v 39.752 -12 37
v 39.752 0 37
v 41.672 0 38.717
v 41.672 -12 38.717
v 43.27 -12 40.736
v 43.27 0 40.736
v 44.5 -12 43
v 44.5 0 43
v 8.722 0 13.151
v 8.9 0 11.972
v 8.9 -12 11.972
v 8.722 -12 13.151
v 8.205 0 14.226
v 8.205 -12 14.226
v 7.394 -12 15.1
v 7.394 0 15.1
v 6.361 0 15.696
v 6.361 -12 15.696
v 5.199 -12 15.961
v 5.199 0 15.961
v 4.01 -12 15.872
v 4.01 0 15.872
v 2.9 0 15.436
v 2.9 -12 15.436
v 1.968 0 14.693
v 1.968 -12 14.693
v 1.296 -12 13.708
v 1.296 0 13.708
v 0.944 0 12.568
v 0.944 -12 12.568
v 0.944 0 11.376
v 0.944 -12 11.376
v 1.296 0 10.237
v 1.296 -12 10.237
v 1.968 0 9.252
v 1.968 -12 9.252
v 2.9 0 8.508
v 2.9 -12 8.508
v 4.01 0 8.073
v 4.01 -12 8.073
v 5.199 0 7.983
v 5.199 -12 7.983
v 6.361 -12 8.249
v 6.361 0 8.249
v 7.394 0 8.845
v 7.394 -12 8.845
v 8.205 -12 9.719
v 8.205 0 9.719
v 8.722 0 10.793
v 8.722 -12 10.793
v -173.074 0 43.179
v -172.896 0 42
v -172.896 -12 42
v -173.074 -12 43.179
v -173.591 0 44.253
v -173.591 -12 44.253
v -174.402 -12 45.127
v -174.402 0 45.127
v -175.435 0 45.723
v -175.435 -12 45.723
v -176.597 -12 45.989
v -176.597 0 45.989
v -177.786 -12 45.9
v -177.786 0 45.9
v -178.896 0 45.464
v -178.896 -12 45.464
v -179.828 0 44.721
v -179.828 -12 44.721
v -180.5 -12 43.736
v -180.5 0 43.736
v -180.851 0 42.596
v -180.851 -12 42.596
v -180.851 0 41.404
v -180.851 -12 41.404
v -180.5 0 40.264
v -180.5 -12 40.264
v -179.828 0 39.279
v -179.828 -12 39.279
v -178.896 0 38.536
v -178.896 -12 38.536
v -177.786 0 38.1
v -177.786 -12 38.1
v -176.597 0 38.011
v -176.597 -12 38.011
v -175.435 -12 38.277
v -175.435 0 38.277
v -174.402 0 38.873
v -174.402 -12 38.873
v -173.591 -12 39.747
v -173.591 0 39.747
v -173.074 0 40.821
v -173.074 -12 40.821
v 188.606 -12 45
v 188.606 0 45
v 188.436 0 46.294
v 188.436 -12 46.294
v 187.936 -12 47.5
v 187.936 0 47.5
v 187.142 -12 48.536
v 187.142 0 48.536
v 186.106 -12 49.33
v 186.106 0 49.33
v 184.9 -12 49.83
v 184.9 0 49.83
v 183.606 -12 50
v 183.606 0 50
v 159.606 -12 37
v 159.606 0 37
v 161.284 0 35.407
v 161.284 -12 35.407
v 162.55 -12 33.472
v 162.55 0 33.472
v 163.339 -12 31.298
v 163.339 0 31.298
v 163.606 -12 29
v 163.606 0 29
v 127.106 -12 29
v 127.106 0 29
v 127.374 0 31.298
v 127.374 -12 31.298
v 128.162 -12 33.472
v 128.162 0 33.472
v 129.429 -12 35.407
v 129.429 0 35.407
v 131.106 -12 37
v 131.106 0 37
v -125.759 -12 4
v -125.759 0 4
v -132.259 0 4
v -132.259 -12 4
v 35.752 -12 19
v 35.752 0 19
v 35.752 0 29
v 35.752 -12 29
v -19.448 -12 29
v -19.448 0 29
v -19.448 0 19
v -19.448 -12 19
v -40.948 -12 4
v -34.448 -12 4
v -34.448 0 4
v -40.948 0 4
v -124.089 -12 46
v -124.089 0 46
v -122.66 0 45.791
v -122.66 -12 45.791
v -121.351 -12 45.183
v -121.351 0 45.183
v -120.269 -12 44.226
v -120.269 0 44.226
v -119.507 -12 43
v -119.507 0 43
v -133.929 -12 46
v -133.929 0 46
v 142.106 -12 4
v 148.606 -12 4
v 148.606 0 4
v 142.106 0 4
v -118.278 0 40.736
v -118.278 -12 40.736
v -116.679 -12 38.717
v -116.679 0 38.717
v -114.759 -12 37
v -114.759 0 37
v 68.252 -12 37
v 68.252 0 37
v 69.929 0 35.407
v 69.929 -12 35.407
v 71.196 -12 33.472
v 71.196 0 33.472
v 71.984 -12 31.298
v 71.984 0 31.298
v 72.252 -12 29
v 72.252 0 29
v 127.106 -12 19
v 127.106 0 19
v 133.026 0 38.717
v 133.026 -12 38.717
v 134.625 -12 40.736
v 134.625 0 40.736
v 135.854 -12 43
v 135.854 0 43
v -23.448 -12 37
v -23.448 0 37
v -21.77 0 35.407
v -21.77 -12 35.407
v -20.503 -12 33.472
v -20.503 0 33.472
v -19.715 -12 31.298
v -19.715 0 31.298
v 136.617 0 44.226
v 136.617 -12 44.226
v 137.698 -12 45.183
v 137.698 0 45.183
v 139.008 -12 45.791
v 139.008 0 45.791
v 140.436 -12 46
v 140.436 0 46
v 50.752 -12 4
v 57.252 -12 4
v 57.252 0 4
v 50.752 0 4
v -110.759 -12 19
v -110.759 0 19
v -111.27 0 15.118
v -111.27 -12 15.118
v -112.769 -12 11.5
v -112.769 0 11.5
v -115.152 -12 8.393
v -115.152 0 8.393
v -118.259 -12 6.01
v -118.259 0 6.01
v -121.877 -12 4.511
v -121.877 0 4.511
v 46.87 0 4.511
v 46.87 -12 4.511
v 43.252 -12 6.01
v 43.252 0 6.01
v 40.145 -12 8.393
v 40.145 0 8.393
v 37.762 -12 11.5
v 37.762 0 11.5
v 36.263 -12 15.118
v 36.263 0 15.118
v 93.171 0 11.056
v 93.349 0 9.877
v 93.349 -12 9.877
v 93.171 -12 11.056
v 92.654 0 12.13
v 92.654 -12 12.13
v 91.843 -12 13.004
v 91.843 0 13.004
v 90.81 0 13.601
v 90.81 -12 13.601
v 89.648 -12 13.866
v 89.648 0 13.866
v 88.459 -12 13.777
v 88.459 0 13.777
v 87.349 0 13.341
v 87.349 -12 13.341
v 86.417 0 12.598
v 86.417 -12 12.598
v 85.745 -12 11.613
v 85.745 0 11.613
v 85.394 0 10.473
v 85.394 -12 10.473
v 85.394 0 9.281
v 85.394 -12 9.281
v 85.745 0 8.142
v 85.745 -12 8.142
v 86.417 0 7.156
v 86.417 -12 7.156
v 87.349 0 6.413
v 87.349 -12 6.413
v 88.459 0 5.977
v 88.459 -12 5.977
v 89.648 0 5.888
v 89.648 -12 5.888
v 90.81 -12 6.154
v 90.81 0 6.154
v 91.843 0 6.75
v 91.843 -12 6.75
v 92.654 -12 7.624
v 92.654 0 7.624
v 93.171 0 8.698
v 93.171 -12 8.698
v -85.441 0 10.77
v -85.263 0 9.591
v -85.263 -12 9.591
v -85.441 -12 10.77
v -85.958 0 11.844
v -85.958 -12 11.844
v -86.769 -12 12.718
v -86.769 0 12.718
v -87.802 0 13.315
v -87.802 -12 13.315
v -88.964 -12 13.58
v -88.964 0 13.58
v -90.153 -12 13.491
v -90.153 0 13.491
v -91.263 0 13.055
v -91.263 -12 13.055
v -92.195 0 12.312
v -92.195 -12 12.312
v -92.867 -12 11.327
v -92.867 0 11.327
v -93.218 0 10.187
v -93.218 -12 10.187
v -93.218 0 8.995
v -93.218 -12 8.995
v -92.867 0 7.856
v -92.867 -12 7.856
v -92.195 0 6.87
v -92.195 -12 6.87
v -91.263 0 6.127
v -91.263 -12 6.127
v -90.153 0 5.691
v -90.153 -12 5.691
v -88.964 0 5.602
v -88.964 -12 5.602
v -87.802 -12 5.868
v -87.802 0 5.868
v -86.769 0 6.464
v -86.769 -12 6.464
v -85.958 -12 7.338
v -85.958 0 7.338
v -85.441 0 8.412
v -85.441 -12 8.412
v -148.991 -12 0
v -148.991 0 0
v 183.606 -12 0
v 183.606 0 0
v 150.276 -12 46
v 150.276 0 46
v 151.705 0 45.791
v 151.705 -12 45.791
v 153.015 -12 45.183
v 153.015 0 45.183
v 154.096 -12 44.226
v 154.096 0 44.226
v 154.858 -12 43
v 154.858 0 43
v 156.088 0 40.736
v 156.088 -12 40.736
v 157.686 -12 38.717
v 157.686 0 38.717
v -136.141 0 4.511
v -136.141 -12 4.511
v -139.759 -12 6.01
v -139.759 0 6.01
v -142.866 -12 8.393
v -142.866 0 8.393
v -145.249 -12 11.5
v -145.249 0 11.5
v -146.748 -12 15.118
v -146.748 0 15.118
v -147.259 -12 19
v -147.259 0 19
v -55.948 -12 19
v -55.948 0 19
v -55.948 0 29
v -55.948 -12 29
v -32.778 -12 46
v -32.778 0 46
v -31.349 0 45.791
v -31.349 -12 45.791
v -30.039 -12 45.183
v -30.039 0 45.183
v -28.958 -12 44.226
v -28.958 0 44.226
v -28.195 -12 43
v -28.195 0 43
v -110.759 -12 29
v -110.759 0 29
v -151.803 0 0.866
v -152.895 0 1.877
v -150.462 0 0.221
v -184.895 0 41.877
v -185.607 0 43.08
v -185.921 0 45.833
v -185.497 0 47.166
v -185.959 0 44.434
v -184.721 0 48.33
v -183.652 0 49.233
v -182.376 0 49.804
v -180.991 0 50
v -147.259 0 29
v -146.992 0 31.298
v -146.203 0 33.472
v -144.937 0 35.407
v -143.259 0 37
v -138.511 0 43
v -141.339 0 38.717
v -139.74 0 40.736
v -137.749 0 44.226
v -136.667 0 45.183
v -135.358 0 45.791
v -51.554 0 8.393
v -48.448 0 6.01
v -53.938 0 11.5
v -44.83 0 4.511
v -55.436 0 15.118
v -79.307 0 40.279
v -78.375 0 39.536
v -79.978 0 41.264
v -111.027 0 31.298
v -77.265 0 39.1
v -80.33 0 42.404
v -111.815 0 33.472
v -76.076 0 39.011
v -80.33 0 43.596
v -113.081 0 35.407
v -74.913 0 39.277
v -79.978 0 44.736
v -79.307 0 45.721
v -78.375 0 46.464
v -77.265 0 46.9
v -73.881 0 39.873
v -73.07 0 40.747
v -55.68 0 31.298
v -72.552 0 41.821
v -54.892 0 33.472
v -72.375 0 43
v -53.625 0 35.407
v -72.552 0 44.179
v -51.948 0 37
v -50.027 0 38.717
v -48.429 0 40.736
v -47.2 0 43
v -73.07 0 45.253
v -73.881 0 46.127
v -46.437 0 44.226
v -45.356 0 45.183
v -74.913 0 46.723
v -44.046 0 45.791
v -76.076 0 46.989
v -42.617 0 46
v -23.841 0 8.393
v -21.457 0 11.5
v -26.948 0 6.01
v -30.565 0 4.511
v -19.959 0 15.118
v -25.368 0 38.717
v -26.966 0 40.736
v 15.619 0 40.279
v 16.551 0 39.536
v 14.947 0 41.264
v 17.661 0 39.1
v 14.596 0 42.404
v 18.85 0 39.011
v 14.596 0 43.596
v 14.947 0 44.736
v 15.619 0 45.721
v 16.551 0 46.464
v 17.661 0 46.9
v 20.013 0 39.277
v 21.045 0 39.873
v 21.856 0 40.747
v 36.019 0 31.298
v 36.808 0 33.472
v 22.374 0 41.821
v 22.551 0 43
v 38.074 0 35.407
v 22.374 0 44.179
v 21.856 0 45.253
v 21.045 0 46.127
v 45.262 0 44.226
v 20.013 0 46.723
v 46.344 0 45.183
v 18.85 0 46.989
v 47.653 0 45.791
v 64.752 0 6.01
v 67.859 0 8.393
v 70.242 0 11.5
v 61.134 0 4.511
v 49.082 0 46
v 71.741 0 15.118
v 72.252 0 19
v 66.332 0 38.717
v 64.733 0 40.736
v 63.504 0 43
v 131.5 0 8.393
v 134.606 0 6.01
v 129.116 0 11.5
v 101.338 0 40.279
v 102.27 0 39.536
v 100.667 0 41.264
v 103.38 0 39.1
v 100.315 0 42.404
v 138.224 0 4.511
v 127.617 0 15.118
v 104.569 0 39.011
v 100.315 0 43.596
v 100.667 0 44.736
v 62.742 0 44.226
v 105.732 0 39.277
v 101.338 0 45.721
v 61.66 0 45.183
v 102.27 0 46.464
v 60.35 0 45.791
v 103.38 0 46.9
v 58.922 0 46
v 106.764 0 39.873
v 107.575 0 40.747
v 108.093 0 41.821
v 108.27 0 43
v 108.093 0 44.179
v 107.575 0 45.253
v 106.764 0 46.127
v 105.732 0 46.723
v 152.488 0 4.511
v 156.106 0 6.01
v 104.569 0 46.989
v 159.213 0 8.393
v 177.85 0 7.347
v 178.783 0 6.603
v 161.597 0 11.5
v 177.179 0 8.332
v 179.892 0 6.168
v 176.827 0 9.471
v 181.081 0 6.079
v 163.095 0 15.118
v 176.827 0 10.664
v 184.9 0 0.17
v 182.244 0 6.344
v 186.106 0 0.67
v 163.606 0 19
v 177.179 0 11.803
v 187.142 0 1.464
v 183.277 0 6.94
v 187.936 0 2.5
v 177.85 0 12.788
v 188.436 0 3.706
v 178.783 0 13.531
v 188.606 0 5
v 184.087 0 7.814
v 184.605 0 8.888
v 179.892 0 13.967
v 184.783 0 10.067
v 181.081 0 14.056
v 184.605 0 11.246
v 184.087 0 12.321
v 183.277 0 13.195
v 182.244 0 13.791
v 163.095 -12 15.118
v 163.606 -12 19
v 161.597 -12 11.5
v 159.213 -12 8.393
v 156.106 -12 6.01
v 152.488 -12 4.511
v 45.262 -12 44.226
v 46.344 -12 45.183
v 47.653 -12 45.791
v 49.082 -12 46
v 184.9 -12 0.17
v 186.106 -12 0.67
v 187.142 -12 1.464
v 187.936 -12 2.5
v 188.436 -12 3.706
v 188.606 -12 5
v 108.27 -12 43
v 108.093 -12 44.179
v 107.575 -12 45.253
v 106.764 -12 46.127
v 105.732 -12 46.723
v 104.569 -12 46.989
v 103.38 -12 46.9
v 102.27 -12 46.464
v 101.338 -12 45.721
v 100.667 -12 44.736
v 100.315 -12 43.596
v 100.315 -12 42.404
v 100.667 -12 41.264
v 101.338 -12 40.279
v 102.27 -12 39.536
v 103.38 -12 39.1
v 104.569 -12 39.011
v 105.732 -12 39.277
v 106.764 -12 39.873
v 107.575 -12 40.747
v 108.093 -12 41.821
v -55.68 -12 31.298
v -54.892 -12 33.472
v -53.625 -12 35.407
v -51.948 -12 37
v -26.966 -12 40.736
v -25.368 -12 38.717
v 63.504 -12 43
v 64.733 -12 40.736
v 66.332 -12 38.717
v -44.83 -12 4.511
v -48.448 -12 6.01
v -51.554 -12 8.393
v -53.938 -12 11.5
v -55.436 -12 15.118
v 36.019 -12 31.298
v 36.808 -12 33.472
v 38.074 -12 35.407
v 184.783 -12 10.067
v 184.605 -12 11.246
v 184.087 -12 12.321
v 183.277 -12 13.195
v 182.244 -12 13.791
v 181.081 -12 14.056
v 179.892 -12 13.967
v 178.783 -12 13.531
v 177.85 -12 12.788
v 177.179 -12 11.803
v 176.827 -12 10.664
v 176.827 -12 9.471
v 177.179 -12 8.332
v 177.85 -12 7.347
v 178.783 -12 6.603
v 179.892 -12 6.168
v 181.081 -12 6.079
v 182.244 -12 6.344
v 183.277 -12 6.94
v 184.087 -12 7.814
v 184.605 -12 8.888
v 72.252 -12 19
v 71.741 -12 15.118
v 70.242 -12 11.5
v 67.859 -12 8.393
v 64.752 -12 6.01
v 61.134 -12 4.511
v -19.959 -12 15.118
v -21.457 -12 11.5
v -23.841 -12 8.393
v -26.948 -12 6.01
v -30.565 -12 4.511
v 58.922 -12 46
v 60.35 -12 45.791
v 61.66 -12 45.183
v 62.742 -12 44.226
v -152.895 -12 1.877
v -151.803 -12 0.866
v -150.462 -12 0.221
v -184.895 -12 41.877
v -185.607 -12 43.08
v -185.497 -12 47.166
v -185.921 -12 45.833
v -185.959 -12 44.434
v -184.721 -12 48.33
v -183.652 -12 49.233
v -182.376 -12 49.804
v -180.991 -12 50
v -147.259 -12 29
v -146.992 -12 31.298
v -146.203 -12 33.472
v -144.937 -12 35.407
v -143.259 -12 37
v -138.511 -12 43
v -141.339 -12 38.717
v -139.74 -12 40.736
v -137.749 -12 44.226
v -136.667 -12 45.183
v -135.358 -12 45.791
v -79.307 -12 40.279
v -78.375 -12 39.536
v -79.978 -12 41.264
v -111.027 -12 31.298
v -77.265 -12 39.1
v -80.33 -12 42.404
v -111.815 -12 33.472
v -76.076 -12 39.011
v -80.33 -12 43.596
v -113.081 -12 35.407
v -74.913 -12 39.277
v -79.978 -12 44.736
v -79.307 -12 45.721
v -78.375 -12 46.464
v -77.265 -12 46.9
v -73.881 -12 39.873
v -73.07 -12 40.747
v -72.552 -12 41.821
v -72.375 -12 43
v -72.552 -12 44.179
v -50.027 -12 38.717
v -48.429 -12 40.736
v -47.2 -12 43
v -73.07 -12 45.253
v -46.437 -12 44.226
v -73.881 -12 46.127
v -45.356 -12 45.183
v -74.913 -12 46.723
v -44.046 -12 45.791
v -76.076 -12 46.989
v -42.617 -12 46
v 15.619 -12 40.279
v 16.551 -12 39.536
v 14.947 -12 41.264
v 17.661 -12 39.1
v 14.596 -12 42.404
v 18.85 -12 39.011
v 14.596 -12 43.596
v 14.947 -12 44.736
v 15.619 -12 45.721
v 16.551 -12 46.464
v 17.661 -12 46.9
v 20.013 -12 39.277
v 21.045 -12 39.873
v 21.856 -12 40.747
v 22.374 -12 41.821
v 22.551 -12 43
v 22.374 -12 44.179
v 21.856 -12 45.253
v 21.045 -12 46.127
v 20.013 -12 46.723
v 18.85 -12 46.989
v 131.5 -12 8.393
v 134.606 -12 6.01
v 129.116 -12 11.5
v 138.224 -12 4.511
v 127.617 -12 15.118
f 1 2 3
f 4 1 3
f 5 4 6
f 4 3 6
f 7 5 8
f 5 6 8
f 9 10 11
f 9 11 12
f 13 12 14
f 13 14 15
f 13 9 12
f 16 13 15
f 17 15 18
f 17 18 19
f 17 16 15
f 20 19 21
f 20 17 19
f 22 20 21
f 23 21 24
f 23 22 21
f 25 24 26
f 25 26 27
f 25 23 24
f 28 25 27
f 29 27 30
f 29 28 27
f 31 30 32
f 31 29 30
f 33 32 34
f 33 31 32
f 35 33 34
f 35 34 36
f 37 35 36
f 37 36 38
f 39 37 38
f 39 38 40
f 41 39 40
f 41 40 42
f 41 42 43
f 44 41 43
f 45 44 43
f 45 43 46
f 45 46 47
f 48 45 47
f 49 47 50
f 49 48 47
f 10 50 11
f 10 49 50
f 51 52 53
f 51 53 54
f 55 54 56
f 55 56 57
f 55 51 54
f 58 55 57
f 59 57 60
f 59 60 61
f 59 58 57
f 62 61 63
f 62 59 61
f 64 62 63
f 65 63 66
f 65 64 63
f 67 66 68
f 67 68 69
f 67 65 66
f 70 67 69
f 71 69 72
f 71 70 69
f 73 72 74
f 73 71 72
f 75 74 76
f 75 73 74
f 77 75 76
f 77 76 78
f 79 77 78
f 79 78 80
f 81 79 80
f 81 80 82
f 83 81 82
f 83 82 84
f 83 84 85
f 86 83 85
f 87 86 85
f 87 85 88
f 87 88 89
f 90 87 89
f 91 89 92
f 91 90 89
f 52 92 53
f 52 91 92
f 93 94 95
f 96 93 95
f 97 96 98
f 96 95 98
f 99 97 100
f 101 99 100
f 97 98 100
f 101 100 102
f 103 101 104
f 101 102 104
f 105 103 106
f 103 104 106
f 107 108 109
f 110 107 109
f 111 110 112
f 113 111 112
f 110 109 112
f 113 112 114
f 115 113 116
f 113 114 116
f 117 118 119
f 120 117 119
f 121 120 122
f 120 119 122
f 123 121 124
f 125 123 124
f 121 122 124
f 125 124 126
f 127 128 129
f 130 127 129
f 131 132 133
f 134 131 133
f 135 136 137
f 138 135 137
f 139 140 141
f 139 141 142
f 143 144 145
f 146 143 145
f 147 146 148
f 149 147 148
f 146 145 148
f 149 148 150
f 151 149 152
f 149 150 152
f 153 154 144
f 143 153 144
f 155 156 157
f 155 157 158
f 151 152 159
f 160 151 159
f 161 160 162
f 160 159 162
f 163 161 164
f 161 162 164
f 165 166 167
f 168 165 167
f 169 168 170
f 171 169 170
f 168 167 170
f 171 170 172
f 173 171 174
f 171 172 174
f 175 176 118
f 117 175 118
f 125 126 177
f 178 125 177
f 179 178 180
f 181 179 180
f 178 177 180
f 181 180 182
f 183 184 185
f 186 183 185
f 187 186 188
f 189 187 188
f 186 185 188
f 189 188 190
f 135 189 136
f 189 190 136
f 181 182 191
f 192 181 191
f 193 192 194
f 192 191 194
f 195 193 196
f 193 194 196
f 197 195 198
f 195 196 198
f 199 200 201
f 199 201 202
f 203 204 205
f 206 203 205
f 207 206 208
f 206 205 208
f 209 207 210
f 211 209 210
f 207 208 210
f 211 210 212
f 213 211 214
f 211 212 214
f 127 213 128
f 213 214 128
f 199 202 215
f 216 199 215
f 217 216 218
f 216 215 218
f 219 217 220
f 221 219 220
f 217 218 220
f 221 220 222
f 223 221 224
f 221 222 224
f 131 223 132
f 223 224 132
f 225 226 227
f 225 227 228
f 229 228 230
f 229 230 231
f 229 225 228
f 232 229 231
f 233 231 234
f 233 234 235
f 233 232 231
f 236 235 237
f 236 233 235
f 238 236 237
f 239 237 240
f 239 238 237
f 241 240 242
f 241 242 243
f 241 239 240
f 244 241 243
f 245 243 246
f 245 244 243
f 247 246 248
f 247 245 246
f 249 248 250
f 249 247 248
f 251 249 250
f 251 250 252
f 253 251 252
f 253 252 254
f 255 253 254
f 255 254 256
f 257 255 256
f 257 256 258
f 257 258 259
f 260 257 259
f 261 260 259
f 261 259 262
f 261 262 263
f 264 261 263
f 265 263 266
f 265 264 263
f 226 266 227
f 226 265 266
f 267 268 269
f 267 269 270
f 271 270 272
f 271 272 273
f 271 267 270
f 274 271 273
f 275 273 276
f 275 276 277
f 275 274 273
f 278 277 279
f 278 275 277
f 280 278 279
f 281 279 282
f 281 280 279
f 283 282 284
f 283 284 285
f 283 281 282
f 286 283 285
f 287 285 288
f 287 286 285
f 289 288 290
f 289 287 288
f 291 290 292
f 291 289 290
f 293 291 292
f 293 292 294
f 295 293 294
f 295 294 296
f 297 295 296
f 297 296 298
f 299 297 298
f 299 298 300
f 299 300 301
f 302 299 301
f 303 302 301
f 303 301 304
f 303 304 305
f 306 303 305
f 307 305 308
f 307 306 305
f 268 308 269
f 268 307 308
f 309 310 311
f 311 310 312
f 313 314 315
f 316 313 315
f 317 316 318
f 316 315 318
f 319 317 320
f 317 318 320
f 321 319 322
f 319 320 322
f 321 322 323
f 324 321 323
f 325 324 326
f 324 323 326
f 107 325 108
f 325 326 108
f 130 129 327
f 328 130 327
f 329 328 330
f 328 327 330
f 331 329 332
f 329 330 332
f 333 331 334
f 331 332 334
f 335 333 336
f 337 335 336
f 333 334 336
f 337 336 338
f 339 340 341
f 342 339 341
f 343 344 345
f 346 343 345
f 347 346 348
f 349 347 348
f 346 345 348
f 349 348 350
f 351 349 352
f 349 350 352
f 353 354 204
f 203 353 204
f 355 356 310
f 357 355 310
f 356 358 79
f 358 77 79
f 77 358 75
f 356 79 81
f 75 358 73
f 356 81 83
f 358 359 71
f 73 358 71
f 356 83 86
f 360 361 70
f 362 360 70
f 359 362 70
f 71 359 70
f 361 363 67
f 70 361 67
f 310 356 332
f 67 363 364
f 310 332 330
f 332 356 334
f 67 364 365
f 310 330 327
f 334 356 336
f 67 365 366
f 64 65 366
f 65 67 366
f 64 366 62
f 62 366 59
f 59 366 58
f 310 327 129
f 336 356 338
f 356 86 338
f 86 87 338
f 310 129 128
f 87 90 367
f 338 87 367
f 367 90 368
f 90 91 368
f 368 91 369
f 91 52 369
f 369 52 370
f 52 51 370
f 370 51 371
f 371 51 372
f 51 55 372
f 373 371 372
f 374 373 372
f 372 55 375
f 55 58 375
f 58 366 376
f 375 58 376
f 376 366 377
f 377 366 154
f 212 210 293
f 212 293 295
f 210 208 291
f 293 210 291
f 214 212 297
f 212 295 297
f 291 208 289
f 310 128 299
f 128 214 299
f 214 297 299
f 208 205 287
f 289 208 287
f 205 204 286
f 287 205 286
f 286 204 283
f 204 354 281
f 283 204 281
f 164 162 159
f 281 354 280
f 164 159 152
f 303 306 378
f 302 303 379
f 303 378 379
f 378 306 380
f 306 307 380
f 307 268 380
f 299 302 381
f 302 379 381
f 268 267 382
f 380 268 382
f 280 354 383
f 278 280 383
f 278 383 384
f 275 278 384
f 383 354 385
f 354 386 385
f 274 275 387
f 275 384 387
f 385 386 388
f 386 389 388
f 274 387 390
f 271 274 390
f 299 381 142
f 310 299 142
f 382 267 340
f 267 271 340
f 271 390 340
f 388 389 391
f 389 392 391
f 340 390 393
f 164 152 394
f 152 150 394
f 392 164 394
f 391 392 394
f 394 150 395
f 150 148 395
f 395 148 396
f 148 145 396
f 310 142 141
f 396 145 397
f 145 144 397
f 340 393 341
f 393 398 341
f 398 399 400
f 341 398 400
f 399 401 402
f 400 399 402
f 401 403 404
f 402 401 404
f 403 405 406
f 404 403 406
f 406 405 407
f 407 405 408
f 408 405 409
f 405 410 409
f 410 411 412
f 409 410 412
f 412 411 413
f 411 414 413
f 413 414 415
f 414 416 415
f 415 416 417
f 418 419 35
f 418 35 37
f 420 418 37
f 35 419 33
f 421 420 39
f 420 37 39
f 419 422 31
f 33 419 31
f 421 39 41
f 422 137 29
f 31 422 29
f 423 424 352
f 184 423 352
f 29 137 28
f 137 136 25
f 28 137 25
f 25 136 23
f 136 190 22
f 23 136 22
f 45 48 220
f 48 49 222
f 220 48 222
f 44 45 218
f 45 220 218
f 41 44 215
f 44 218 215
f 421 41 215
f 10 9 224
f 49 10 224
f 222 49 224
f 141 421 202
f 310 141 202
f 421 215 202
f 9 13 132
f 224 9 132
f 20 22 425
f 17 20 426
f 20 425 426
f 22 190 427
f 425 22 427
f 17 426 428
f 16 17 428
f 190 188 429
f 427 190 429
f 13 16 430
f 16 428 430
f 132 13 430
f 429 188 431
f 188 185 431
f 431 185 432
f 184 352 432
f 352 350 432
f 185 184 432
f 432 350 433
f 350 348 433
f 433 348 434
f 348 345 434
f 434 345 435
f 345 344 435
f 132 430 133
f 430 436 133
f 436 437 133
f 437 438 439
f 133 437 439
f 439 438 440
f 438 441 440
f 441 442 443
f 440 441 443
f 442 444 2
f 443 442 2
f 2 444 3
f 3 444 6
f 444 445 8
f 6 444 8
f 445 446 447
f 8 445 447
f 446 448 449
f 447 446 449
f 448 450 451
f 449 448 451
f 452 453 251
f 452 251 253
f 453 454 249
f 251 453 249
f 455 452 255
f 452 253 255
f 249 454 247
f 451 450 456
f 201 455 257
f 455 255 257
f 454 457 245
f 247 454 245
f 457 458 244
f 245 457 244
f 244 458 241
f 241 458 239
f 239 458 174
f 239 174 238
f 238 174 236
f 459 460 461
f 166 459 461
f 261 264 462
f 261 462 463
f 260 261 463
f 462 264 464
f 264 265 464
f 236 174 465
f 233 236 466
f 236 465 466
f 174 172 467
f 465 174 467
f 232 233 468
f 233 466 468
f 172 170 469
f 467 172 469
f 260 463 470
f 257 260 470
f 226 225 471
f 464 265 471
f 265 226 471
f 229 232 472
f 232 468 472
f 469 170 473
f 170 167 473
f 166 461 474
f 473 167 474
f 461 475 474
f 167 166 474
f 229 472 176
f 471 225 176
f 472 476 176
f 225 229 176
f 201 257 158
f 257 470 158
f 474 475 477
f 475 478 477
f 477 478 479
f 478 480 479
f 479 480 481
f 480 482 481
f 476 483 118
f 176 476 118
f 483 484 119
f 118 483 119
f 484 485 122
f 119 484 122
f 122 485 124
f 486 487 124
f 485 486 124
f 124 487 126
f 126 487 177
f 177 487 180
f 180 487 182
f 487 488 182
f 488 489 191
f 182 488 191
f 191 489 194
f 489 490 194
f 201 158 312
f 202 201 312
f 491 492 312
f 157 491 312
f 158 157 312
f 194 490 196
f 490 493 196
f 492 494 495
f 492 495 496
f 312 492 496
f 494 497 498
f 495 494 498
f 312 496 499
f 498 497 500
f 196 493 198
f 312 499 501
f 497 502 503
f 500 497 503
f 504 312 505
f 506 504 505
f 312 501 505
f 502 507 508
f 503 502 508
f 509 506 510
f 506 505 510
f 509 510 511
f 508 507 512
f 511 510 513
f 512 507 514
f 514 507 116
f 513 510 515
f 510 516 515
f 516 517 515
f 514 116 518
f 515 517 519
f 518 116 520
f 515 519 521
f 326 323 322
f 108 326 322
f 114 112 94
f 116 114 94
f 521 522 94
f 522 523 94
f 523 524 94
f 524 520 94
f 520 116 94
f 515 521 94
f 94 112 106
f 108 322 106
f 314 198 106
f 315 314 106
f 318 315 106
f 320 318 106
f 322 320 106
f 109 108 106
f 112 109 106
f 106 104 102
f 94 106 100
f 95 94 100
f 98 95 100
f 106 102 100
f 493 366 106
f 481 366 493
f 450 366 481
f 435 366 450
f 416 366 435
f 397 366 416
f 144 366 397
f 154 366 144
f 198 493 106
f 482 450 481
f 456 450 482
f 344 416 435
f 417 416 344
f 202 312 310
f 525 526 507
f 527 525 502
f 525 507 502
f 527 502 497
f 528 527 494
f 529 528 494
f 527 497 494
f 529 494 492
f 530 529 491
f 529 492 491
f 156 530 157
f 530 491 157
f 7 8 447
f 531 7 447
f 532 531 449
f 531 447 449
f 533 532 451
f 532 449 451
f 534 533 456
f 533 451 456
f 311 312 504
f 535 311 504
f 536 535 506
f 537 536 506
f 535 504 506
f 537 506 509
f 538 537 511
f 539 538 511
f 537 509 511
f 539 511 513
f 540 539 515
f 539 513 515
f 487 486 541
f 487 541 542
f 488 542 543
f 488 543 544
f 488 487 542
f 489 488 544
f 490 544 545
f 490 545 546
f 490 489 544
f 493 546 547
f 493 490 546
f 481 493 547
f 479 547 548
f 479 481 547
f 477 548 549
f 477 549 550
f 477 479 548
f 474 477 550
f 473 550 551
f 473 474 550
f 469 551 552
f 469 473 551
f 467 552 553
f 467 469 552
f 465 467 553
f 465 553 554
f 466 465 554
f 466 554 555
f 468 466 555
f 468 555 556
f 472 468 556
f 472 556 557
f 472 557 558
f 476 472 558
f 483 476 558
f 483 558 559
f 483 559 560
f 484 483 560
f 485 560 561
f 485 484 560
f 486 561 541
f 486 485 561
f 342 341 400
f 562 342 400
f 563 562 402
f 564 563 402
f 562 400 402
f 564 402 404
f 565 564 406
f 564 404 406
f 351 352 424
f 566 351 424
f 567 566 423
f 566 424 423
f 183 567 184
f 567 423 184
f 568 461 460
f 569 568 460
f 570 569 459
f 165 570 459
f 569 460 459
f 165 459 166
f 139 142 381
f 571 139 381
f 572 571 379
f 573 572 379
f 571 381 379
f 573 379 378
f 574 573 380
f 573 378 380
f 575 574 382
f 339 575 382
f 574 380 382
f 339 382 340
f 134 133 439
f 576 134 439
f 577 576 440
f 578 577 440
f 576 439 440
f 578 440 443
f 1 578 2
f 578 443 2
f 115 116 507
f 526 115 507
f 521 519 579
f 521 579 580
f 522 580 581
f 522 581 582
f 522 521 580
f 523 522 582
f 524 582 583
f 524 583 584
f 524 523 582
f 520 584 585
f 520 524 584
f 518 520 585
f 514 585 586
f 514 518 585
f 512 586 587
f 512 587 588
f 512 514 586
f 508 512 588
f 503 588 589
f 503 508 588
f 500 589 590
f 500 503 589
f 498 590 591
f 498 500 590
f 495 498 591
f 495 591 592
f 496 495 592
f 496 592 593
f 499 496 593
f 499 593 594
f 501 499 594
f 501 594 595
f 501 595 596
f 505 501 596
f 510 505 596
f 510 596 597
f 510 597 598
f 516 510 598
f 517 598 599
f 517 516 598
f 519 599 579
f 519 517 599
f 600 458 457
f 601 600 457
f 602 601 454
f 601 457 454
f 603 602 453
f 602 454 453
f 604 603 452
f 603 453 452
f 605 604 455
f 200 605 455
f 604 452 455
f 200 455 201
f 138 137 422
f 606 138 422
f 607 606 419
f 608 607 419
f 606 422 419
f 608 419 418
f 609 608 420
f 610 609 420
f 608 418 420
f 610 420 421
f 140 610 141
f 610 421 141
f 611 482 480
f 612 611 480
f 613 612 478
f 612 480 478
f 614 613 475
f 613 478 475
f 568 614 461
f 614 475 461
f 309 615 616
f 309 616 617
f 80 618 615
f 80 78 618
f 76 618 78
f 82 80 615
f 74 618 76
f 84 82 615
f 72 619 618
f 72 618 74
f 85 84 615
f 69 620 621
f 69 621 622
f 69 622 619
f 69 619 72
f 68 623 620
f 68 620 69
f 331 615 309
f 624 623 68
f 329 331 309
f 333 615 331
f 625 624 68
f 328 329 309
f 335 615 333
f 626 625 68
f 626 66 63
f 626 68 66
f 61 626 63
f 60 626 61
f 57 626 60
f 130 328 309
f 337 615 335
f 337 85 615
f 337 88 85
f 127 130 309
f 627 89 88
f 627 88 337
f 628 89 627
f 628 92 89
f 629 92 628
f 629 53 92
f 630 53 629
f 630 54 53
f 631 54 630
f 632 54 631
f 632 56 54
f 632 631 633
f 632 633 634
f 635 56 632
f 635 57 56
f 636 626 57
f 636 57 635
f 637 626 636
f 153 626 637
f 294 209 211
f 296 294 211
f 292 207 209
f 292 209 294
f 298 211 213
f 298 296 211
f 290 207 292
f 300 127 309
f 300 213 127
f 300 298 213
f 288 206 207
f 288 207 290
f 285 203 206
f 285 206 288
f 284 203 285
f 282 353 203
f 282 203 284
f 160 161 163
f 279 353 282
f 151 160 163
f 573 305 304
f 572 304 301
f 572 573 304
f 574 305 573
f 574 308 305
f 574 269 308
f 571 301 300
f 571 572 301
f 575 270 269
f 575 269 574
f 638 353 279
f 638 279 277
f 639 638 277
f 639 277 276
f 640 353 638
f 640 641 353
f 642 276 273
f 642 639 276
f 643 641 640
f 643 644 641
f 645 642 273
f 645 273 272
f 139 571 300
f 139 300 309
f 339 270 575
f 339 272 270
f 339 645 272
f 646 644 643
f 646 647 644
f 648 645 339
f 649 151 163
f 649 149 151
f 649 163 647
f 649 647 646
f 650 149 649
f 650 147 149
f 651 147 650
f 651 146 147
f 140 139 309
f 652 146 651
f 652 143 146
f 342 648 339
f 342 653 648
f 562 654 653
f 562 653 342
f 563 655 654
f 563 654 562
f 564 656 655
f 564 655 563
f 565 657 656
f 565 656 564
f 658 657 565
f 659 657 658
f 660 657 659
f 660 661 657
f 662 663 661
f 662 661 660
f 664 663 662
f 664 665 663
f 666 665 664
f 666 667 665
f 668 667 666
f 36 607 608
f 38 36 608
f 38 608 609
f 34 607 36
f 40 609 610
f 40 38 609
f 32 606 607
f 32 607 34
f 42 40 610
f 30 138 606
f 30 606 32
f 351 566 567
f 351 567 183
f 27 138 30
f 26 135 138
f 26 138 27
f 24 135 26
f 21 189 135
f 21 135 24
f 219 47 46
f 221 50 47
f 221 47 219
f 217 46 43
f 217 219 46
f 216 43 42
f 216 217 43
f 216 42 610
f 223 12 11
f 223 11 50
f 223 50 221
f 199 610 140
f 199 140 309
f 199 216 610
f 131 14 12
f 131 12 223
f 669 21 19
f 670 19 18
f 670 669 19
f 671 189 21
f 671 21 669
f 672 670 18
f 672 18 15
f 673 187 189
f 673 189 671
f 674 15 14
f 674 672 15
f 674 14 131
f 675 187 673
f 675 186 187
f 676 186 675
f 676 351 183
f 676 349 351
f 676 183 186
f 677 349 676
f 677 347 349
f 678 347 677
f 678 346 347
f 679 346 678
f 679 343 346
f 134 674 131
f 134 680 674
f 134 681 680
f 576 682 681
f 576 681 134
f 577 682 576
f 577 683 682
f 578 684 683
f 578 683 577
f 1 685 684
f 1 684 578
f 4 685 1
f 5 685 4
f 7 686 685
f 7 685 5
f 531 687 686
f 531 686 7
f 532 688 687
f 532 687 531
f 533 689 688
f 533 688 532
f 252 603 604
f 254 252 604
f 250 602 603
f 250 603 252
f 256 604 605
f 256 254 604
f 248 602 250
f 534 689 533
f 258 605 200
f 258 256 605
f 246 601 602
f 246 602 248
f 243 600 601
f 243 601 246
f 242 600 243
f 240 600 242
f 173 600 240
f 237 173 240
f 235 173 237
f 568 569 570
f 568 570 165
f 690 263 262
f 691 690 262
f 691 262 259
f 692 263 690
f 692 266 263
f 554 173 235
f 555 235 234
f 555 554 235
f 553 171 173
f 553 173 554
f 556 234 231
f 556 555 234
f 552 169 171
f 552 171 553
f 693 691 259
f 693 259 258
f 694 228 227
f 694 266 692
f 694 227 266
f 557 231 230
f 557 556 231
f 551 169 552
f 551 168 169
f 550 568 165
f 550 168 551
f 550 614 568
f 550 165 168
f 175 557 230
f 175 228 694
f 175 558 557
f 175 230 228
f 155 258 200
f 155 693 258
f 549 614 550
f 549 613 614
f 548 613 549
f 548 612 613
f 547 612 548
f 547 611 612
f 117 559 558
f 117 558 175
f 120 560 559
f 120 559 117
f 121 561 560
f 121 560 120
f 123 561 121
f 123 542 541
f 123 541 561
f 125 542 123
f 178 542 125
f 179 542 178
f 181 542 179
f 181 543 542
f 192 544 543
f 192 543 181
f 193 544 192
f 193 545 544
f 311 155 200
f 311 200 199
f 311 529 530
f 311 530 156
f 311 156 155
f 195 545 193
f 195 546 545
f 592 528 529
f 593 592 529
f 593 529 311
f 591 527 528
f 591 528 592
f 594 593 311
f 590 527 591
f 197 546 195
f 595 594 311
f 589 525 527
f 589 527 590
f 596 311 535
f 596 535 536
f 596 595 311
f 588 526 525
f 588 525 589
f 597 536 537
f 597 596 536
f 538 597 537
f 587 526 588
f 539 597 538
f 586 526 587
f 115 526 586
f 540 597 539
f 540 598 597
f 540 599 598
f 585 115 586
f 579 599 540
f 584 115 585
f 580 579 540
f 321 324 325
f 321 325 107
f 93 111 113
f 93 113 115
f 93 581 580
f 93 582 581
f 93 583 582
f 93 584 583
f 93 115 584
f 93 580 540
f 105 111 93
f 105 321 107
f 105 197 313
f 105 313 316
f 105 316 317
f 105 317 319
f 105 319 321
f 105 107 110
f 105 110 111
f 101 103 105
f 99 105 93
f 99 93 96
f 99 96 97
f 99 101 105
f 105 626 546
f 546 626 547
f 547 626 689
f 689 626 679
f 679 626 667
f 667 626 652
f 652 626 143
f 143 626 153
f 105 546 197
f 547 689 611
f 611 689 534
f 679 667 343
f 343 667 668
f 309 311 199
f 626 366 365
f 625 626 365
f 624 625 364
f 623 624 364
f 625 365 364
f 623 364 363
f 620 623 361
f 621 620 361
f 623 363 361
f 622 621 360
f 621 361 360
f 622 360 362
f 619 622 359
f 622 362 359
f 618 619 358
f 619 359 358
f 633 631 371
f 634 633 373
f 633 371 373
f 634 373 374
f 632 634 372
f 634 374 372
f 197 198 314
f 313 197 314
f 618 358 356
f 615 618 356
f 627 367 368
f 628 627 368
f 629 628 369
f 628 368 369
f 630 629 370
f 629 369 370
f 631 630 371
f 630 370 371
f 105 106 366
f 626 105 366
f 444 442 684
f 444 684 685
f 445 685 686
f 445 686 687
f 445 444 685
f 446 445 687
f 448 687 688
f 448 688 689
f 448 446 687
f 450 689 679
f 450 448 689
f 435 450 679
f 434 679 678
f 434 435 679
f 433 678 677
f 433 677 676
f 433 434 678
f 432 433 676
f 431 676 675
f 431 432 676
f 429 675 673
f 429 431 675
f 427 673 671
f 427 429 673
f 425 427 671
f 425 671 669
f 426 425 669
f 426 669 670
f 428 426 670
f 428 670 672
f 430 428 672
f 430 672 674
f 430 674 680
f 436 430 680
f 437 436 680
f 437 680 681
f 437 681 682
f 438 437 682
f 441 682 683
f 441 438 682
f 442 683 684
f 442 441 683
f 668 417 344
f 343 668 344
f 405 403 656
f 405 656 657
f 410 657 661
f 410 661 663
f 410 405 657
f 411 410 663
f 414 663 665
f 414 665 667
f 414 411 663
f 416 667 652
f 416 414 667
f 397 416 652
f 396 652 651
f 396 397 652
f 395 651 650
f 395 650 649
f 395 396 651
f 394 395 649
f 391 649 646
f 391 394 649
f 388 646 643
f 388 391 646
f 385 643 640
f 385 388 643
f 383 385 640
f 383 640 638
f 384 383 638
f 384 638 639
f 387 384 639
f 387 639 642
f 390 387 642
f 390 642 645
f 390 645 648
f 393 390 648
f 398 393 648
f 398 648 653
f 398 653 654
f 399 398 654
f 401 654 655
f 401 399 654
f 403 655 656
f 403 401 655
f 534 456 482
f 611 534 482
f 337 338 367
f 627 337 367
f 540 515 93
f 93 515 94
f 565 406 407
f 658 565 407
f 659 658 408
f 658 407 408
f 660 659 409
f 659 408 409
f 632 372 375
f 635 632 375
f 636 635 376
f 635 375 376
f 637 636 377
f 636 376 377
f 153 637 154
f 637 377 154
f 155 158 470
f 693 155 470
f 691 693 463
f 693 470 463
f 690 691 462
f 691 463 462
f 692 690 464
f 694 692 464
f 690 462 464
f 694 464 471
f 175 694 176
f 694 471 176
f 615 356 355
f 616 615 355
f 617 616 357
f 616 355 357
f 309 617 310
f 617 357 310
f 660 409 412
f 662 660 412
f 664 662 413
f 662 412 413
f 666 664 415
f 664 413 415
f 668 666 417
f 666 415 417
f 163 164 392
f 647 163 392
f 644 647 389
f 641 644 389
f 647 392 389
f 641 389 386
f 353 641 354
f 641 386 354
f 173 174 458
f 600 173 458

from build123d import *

# Parameters (mm, degrees)
F0_R     = 4
F1_DEPTH = 12


with BuildPart() as f1:
    # F0 (on Front) → F1 (new body)
    with BuildSketch(Plane.XZ):
        with BuildLine():
            Line((183.606194, 50), (-180.990682, 50))
            ThreePointArc((-180.990682, 50), (-185.497198, 47.165944), (-184.895026, 41.876525))
            Line((-184.895026, 41.876525), (-152.895026, 1.876525))
            ThreePointArc((-152.895026, 1.876525), (-151.156626, 0.493484), (-148.990682, 0))
            Line((-148.990682, 0), (183.606194, 0))
            ThreePointArc((183.606194, 0), (187.141728, 1.464466), (188.606194, 5))
            Line((188.606194, 5), (188.606194, 45))
            ThreePointArc((188.606194, 45), (187.141728, 48.535534), (183.606194, 50))
        make_face()
        with Locations((-89.263029, 9.591162)):
            Circle(F0_R, mode=Mode.SUBTRACT)
        with BuildLine():
            Line((-133.928709, 46), (-124.089315, 46))
            ThreePointArc((-124.089315, 46), (-121.350702, 45.1833), (-119.506739, 43))
            ThreePointArc((-119.506739, 43), (-117.521867, 39.692195), (-114.759012, 37))
            ThreePointArc((-114.759012, 37), (-111.81474, 33.472136), (-110.759012, 29))
            Line((-110.759012, 29), (-110.759012, 19))
            ThreePointArc((-110.759012, 19), (-115.15241, 8.393398), (-125.759012, 4))
            Line((-125.759012, 4), (-132.259012, 4))
            ThreePointArc((-132.259012, 4), (-142.865614, 8.393398), (-147.259012, 19))
            Line((-147.259012, 19), (-147.259012, 29))
            ThreePointArc((-147.259012, 29), (-146.203284, 33.472136), (-143.259012, 37))
            ThreePointArc((-143.259012, 37), (-140.496156, 39.692195), (-138.511285, 43))
            ThreePointArc((-138.511285, 43), (-136.667322, 45.1833), (-133.928709, 46))
        make_face(mode=Mode.SUBTRACT)
        with BuildLine():
            Line((-42.617198, 46), (-32.777804, 46))
            ThreePointArc((-32.777804, 46), (-30.039191, 45.1833), (-28.195228, 43))
            ThreePointArc((-28.195228, 43), (-26.210357, 39.692195), (-23.447501, 37))
            ThreePointArc((-23.447501, 37), (-20.503229, 33.472136), (-19.447501, 29))
            Line((-19.447501, 29), (-19.447501, 19))
            ThreePointArc((-19.447501, 19), (-23.840899, 8.393398), (-34.447501, 4))
            Line((-34.447501, 4), (-40.947501, 4))
            ThreePointArc((-40.947501, 4), (-51.554103, 8.393398), (-55.947501, 19))
            Line((-55.947501, 19), (-55.947501, 29))
            ThreePointArc((-55.947501, 29), (-54.891773, 33.472136), (-51.947501, 37))
            ThreePointArc((-51.947501, 37), (-49.184646, 39.692195), (-47.199774, 43))
            ThreePointArc((-47.199774, 43), (-45.355811, 45.1833), (-42.617198, 46))
        make_face(mode=Mode.SUBTRACT)
        with Locations((4.899797, 11.972248)):
            Circle(F0_R, mode=Mode.SUBTRACT)
        with Locations((89.348912, 9.877115)):
            Circle(F0_R, mode=Mode.SUBTRACT)
        with Locations((180.782542, 10.067379)):
            Circle(F0_R, mode=Mode.SUBTRACT)
        with BuildLine():
            Line((49.082204, 46), (58.921599, 46))
            ThreePointArc((58.921599, 46), (61.660212, 45.1833), (63.504174, 43))
            ThreePointArc((63.504174, 43), (65.489046, 39.692195), (68.251902, 37))
            ThreePointArc((68.251902, 37), (71.196173, 33.472136), (72.251902, 29))
            Line((72.251902, 29), (72.251902, 19))
            ThreePointArc((72.251902, 19), (67.858503, 8.393398), (57.251902, 4))
            Line((57.251902, 4), (50.751902, 4))
            ThreePointArc((50.751902, 4), (40.1453, 8.393398), (35.751902, 19))
            Line((35.751902, 19), (35.751902, 29))
            ThreePointArc((35.751902, 29), (36.80763, 33.472136), (39.751902, 37))
            ThreePointArc((39.751902, 37), (42.514757, 39.692195), (44.499629, 43))
            ThreePointArc((44.499629, 43), (46.343592, 45.1833), (49.082204, 46))
        make_face(mode=Mode.SUBTRACT)
        with Locations((-176.895979, 42)):
            Circle(F0_R, mode=Mode.SUBTRACT)
        with Locations((-76.374538, 43)):
            Circle(F0_R, mode=Mode.SUBTRACT)
        with BuildLine():
            Line((140.436497, 46), (150.275891, 46))
            ThreePointArc((150.275891, 46), (153.014504, 45.1833), (154.858467, 43))
            ThreePointArc((154.858467, 43), (156.843338, 39.692195), (159.606194, 37))
            ThreePointArc((159.606194, 37), (162.550466, 33.472136), (163.606194, 29))
            Line((163.606194, 29), (163.606194, 19))
            ThreePointArc((163.606194, 19), (159.212796, 8.393398), (148.606194, 4))
            Line((148.606194, 4), (142.106194, 4))
            ThreePointArc((142.106194, 4), (131.499592, 8.393398), (127.106194, 19))
            Line((127.106194, 19), (127.106194, 29))
            ThreePointArc((127.106194, 29), (128.161922, 33.472136), (131.106194, 37))
            ThreePointArc((131.106194, 37), (133.869049, 39.692195), (135.853921, 43))
            ThreePointArc((135.853921, 43), (137.697884, 45.1833), (140.436497, 46))
        make_face(mode=Mode.SUBTRACT)
        with Locations((18.551346, 43)):
            Circle(F0_R, mode=Mode.SUBTRACT)
        with Locations((104.270376, 43)):
            Circle(F0_R, mode=Mode.SUBTRACT)
    extrude(amount=F1_DEPTH)


solid = f1.part
